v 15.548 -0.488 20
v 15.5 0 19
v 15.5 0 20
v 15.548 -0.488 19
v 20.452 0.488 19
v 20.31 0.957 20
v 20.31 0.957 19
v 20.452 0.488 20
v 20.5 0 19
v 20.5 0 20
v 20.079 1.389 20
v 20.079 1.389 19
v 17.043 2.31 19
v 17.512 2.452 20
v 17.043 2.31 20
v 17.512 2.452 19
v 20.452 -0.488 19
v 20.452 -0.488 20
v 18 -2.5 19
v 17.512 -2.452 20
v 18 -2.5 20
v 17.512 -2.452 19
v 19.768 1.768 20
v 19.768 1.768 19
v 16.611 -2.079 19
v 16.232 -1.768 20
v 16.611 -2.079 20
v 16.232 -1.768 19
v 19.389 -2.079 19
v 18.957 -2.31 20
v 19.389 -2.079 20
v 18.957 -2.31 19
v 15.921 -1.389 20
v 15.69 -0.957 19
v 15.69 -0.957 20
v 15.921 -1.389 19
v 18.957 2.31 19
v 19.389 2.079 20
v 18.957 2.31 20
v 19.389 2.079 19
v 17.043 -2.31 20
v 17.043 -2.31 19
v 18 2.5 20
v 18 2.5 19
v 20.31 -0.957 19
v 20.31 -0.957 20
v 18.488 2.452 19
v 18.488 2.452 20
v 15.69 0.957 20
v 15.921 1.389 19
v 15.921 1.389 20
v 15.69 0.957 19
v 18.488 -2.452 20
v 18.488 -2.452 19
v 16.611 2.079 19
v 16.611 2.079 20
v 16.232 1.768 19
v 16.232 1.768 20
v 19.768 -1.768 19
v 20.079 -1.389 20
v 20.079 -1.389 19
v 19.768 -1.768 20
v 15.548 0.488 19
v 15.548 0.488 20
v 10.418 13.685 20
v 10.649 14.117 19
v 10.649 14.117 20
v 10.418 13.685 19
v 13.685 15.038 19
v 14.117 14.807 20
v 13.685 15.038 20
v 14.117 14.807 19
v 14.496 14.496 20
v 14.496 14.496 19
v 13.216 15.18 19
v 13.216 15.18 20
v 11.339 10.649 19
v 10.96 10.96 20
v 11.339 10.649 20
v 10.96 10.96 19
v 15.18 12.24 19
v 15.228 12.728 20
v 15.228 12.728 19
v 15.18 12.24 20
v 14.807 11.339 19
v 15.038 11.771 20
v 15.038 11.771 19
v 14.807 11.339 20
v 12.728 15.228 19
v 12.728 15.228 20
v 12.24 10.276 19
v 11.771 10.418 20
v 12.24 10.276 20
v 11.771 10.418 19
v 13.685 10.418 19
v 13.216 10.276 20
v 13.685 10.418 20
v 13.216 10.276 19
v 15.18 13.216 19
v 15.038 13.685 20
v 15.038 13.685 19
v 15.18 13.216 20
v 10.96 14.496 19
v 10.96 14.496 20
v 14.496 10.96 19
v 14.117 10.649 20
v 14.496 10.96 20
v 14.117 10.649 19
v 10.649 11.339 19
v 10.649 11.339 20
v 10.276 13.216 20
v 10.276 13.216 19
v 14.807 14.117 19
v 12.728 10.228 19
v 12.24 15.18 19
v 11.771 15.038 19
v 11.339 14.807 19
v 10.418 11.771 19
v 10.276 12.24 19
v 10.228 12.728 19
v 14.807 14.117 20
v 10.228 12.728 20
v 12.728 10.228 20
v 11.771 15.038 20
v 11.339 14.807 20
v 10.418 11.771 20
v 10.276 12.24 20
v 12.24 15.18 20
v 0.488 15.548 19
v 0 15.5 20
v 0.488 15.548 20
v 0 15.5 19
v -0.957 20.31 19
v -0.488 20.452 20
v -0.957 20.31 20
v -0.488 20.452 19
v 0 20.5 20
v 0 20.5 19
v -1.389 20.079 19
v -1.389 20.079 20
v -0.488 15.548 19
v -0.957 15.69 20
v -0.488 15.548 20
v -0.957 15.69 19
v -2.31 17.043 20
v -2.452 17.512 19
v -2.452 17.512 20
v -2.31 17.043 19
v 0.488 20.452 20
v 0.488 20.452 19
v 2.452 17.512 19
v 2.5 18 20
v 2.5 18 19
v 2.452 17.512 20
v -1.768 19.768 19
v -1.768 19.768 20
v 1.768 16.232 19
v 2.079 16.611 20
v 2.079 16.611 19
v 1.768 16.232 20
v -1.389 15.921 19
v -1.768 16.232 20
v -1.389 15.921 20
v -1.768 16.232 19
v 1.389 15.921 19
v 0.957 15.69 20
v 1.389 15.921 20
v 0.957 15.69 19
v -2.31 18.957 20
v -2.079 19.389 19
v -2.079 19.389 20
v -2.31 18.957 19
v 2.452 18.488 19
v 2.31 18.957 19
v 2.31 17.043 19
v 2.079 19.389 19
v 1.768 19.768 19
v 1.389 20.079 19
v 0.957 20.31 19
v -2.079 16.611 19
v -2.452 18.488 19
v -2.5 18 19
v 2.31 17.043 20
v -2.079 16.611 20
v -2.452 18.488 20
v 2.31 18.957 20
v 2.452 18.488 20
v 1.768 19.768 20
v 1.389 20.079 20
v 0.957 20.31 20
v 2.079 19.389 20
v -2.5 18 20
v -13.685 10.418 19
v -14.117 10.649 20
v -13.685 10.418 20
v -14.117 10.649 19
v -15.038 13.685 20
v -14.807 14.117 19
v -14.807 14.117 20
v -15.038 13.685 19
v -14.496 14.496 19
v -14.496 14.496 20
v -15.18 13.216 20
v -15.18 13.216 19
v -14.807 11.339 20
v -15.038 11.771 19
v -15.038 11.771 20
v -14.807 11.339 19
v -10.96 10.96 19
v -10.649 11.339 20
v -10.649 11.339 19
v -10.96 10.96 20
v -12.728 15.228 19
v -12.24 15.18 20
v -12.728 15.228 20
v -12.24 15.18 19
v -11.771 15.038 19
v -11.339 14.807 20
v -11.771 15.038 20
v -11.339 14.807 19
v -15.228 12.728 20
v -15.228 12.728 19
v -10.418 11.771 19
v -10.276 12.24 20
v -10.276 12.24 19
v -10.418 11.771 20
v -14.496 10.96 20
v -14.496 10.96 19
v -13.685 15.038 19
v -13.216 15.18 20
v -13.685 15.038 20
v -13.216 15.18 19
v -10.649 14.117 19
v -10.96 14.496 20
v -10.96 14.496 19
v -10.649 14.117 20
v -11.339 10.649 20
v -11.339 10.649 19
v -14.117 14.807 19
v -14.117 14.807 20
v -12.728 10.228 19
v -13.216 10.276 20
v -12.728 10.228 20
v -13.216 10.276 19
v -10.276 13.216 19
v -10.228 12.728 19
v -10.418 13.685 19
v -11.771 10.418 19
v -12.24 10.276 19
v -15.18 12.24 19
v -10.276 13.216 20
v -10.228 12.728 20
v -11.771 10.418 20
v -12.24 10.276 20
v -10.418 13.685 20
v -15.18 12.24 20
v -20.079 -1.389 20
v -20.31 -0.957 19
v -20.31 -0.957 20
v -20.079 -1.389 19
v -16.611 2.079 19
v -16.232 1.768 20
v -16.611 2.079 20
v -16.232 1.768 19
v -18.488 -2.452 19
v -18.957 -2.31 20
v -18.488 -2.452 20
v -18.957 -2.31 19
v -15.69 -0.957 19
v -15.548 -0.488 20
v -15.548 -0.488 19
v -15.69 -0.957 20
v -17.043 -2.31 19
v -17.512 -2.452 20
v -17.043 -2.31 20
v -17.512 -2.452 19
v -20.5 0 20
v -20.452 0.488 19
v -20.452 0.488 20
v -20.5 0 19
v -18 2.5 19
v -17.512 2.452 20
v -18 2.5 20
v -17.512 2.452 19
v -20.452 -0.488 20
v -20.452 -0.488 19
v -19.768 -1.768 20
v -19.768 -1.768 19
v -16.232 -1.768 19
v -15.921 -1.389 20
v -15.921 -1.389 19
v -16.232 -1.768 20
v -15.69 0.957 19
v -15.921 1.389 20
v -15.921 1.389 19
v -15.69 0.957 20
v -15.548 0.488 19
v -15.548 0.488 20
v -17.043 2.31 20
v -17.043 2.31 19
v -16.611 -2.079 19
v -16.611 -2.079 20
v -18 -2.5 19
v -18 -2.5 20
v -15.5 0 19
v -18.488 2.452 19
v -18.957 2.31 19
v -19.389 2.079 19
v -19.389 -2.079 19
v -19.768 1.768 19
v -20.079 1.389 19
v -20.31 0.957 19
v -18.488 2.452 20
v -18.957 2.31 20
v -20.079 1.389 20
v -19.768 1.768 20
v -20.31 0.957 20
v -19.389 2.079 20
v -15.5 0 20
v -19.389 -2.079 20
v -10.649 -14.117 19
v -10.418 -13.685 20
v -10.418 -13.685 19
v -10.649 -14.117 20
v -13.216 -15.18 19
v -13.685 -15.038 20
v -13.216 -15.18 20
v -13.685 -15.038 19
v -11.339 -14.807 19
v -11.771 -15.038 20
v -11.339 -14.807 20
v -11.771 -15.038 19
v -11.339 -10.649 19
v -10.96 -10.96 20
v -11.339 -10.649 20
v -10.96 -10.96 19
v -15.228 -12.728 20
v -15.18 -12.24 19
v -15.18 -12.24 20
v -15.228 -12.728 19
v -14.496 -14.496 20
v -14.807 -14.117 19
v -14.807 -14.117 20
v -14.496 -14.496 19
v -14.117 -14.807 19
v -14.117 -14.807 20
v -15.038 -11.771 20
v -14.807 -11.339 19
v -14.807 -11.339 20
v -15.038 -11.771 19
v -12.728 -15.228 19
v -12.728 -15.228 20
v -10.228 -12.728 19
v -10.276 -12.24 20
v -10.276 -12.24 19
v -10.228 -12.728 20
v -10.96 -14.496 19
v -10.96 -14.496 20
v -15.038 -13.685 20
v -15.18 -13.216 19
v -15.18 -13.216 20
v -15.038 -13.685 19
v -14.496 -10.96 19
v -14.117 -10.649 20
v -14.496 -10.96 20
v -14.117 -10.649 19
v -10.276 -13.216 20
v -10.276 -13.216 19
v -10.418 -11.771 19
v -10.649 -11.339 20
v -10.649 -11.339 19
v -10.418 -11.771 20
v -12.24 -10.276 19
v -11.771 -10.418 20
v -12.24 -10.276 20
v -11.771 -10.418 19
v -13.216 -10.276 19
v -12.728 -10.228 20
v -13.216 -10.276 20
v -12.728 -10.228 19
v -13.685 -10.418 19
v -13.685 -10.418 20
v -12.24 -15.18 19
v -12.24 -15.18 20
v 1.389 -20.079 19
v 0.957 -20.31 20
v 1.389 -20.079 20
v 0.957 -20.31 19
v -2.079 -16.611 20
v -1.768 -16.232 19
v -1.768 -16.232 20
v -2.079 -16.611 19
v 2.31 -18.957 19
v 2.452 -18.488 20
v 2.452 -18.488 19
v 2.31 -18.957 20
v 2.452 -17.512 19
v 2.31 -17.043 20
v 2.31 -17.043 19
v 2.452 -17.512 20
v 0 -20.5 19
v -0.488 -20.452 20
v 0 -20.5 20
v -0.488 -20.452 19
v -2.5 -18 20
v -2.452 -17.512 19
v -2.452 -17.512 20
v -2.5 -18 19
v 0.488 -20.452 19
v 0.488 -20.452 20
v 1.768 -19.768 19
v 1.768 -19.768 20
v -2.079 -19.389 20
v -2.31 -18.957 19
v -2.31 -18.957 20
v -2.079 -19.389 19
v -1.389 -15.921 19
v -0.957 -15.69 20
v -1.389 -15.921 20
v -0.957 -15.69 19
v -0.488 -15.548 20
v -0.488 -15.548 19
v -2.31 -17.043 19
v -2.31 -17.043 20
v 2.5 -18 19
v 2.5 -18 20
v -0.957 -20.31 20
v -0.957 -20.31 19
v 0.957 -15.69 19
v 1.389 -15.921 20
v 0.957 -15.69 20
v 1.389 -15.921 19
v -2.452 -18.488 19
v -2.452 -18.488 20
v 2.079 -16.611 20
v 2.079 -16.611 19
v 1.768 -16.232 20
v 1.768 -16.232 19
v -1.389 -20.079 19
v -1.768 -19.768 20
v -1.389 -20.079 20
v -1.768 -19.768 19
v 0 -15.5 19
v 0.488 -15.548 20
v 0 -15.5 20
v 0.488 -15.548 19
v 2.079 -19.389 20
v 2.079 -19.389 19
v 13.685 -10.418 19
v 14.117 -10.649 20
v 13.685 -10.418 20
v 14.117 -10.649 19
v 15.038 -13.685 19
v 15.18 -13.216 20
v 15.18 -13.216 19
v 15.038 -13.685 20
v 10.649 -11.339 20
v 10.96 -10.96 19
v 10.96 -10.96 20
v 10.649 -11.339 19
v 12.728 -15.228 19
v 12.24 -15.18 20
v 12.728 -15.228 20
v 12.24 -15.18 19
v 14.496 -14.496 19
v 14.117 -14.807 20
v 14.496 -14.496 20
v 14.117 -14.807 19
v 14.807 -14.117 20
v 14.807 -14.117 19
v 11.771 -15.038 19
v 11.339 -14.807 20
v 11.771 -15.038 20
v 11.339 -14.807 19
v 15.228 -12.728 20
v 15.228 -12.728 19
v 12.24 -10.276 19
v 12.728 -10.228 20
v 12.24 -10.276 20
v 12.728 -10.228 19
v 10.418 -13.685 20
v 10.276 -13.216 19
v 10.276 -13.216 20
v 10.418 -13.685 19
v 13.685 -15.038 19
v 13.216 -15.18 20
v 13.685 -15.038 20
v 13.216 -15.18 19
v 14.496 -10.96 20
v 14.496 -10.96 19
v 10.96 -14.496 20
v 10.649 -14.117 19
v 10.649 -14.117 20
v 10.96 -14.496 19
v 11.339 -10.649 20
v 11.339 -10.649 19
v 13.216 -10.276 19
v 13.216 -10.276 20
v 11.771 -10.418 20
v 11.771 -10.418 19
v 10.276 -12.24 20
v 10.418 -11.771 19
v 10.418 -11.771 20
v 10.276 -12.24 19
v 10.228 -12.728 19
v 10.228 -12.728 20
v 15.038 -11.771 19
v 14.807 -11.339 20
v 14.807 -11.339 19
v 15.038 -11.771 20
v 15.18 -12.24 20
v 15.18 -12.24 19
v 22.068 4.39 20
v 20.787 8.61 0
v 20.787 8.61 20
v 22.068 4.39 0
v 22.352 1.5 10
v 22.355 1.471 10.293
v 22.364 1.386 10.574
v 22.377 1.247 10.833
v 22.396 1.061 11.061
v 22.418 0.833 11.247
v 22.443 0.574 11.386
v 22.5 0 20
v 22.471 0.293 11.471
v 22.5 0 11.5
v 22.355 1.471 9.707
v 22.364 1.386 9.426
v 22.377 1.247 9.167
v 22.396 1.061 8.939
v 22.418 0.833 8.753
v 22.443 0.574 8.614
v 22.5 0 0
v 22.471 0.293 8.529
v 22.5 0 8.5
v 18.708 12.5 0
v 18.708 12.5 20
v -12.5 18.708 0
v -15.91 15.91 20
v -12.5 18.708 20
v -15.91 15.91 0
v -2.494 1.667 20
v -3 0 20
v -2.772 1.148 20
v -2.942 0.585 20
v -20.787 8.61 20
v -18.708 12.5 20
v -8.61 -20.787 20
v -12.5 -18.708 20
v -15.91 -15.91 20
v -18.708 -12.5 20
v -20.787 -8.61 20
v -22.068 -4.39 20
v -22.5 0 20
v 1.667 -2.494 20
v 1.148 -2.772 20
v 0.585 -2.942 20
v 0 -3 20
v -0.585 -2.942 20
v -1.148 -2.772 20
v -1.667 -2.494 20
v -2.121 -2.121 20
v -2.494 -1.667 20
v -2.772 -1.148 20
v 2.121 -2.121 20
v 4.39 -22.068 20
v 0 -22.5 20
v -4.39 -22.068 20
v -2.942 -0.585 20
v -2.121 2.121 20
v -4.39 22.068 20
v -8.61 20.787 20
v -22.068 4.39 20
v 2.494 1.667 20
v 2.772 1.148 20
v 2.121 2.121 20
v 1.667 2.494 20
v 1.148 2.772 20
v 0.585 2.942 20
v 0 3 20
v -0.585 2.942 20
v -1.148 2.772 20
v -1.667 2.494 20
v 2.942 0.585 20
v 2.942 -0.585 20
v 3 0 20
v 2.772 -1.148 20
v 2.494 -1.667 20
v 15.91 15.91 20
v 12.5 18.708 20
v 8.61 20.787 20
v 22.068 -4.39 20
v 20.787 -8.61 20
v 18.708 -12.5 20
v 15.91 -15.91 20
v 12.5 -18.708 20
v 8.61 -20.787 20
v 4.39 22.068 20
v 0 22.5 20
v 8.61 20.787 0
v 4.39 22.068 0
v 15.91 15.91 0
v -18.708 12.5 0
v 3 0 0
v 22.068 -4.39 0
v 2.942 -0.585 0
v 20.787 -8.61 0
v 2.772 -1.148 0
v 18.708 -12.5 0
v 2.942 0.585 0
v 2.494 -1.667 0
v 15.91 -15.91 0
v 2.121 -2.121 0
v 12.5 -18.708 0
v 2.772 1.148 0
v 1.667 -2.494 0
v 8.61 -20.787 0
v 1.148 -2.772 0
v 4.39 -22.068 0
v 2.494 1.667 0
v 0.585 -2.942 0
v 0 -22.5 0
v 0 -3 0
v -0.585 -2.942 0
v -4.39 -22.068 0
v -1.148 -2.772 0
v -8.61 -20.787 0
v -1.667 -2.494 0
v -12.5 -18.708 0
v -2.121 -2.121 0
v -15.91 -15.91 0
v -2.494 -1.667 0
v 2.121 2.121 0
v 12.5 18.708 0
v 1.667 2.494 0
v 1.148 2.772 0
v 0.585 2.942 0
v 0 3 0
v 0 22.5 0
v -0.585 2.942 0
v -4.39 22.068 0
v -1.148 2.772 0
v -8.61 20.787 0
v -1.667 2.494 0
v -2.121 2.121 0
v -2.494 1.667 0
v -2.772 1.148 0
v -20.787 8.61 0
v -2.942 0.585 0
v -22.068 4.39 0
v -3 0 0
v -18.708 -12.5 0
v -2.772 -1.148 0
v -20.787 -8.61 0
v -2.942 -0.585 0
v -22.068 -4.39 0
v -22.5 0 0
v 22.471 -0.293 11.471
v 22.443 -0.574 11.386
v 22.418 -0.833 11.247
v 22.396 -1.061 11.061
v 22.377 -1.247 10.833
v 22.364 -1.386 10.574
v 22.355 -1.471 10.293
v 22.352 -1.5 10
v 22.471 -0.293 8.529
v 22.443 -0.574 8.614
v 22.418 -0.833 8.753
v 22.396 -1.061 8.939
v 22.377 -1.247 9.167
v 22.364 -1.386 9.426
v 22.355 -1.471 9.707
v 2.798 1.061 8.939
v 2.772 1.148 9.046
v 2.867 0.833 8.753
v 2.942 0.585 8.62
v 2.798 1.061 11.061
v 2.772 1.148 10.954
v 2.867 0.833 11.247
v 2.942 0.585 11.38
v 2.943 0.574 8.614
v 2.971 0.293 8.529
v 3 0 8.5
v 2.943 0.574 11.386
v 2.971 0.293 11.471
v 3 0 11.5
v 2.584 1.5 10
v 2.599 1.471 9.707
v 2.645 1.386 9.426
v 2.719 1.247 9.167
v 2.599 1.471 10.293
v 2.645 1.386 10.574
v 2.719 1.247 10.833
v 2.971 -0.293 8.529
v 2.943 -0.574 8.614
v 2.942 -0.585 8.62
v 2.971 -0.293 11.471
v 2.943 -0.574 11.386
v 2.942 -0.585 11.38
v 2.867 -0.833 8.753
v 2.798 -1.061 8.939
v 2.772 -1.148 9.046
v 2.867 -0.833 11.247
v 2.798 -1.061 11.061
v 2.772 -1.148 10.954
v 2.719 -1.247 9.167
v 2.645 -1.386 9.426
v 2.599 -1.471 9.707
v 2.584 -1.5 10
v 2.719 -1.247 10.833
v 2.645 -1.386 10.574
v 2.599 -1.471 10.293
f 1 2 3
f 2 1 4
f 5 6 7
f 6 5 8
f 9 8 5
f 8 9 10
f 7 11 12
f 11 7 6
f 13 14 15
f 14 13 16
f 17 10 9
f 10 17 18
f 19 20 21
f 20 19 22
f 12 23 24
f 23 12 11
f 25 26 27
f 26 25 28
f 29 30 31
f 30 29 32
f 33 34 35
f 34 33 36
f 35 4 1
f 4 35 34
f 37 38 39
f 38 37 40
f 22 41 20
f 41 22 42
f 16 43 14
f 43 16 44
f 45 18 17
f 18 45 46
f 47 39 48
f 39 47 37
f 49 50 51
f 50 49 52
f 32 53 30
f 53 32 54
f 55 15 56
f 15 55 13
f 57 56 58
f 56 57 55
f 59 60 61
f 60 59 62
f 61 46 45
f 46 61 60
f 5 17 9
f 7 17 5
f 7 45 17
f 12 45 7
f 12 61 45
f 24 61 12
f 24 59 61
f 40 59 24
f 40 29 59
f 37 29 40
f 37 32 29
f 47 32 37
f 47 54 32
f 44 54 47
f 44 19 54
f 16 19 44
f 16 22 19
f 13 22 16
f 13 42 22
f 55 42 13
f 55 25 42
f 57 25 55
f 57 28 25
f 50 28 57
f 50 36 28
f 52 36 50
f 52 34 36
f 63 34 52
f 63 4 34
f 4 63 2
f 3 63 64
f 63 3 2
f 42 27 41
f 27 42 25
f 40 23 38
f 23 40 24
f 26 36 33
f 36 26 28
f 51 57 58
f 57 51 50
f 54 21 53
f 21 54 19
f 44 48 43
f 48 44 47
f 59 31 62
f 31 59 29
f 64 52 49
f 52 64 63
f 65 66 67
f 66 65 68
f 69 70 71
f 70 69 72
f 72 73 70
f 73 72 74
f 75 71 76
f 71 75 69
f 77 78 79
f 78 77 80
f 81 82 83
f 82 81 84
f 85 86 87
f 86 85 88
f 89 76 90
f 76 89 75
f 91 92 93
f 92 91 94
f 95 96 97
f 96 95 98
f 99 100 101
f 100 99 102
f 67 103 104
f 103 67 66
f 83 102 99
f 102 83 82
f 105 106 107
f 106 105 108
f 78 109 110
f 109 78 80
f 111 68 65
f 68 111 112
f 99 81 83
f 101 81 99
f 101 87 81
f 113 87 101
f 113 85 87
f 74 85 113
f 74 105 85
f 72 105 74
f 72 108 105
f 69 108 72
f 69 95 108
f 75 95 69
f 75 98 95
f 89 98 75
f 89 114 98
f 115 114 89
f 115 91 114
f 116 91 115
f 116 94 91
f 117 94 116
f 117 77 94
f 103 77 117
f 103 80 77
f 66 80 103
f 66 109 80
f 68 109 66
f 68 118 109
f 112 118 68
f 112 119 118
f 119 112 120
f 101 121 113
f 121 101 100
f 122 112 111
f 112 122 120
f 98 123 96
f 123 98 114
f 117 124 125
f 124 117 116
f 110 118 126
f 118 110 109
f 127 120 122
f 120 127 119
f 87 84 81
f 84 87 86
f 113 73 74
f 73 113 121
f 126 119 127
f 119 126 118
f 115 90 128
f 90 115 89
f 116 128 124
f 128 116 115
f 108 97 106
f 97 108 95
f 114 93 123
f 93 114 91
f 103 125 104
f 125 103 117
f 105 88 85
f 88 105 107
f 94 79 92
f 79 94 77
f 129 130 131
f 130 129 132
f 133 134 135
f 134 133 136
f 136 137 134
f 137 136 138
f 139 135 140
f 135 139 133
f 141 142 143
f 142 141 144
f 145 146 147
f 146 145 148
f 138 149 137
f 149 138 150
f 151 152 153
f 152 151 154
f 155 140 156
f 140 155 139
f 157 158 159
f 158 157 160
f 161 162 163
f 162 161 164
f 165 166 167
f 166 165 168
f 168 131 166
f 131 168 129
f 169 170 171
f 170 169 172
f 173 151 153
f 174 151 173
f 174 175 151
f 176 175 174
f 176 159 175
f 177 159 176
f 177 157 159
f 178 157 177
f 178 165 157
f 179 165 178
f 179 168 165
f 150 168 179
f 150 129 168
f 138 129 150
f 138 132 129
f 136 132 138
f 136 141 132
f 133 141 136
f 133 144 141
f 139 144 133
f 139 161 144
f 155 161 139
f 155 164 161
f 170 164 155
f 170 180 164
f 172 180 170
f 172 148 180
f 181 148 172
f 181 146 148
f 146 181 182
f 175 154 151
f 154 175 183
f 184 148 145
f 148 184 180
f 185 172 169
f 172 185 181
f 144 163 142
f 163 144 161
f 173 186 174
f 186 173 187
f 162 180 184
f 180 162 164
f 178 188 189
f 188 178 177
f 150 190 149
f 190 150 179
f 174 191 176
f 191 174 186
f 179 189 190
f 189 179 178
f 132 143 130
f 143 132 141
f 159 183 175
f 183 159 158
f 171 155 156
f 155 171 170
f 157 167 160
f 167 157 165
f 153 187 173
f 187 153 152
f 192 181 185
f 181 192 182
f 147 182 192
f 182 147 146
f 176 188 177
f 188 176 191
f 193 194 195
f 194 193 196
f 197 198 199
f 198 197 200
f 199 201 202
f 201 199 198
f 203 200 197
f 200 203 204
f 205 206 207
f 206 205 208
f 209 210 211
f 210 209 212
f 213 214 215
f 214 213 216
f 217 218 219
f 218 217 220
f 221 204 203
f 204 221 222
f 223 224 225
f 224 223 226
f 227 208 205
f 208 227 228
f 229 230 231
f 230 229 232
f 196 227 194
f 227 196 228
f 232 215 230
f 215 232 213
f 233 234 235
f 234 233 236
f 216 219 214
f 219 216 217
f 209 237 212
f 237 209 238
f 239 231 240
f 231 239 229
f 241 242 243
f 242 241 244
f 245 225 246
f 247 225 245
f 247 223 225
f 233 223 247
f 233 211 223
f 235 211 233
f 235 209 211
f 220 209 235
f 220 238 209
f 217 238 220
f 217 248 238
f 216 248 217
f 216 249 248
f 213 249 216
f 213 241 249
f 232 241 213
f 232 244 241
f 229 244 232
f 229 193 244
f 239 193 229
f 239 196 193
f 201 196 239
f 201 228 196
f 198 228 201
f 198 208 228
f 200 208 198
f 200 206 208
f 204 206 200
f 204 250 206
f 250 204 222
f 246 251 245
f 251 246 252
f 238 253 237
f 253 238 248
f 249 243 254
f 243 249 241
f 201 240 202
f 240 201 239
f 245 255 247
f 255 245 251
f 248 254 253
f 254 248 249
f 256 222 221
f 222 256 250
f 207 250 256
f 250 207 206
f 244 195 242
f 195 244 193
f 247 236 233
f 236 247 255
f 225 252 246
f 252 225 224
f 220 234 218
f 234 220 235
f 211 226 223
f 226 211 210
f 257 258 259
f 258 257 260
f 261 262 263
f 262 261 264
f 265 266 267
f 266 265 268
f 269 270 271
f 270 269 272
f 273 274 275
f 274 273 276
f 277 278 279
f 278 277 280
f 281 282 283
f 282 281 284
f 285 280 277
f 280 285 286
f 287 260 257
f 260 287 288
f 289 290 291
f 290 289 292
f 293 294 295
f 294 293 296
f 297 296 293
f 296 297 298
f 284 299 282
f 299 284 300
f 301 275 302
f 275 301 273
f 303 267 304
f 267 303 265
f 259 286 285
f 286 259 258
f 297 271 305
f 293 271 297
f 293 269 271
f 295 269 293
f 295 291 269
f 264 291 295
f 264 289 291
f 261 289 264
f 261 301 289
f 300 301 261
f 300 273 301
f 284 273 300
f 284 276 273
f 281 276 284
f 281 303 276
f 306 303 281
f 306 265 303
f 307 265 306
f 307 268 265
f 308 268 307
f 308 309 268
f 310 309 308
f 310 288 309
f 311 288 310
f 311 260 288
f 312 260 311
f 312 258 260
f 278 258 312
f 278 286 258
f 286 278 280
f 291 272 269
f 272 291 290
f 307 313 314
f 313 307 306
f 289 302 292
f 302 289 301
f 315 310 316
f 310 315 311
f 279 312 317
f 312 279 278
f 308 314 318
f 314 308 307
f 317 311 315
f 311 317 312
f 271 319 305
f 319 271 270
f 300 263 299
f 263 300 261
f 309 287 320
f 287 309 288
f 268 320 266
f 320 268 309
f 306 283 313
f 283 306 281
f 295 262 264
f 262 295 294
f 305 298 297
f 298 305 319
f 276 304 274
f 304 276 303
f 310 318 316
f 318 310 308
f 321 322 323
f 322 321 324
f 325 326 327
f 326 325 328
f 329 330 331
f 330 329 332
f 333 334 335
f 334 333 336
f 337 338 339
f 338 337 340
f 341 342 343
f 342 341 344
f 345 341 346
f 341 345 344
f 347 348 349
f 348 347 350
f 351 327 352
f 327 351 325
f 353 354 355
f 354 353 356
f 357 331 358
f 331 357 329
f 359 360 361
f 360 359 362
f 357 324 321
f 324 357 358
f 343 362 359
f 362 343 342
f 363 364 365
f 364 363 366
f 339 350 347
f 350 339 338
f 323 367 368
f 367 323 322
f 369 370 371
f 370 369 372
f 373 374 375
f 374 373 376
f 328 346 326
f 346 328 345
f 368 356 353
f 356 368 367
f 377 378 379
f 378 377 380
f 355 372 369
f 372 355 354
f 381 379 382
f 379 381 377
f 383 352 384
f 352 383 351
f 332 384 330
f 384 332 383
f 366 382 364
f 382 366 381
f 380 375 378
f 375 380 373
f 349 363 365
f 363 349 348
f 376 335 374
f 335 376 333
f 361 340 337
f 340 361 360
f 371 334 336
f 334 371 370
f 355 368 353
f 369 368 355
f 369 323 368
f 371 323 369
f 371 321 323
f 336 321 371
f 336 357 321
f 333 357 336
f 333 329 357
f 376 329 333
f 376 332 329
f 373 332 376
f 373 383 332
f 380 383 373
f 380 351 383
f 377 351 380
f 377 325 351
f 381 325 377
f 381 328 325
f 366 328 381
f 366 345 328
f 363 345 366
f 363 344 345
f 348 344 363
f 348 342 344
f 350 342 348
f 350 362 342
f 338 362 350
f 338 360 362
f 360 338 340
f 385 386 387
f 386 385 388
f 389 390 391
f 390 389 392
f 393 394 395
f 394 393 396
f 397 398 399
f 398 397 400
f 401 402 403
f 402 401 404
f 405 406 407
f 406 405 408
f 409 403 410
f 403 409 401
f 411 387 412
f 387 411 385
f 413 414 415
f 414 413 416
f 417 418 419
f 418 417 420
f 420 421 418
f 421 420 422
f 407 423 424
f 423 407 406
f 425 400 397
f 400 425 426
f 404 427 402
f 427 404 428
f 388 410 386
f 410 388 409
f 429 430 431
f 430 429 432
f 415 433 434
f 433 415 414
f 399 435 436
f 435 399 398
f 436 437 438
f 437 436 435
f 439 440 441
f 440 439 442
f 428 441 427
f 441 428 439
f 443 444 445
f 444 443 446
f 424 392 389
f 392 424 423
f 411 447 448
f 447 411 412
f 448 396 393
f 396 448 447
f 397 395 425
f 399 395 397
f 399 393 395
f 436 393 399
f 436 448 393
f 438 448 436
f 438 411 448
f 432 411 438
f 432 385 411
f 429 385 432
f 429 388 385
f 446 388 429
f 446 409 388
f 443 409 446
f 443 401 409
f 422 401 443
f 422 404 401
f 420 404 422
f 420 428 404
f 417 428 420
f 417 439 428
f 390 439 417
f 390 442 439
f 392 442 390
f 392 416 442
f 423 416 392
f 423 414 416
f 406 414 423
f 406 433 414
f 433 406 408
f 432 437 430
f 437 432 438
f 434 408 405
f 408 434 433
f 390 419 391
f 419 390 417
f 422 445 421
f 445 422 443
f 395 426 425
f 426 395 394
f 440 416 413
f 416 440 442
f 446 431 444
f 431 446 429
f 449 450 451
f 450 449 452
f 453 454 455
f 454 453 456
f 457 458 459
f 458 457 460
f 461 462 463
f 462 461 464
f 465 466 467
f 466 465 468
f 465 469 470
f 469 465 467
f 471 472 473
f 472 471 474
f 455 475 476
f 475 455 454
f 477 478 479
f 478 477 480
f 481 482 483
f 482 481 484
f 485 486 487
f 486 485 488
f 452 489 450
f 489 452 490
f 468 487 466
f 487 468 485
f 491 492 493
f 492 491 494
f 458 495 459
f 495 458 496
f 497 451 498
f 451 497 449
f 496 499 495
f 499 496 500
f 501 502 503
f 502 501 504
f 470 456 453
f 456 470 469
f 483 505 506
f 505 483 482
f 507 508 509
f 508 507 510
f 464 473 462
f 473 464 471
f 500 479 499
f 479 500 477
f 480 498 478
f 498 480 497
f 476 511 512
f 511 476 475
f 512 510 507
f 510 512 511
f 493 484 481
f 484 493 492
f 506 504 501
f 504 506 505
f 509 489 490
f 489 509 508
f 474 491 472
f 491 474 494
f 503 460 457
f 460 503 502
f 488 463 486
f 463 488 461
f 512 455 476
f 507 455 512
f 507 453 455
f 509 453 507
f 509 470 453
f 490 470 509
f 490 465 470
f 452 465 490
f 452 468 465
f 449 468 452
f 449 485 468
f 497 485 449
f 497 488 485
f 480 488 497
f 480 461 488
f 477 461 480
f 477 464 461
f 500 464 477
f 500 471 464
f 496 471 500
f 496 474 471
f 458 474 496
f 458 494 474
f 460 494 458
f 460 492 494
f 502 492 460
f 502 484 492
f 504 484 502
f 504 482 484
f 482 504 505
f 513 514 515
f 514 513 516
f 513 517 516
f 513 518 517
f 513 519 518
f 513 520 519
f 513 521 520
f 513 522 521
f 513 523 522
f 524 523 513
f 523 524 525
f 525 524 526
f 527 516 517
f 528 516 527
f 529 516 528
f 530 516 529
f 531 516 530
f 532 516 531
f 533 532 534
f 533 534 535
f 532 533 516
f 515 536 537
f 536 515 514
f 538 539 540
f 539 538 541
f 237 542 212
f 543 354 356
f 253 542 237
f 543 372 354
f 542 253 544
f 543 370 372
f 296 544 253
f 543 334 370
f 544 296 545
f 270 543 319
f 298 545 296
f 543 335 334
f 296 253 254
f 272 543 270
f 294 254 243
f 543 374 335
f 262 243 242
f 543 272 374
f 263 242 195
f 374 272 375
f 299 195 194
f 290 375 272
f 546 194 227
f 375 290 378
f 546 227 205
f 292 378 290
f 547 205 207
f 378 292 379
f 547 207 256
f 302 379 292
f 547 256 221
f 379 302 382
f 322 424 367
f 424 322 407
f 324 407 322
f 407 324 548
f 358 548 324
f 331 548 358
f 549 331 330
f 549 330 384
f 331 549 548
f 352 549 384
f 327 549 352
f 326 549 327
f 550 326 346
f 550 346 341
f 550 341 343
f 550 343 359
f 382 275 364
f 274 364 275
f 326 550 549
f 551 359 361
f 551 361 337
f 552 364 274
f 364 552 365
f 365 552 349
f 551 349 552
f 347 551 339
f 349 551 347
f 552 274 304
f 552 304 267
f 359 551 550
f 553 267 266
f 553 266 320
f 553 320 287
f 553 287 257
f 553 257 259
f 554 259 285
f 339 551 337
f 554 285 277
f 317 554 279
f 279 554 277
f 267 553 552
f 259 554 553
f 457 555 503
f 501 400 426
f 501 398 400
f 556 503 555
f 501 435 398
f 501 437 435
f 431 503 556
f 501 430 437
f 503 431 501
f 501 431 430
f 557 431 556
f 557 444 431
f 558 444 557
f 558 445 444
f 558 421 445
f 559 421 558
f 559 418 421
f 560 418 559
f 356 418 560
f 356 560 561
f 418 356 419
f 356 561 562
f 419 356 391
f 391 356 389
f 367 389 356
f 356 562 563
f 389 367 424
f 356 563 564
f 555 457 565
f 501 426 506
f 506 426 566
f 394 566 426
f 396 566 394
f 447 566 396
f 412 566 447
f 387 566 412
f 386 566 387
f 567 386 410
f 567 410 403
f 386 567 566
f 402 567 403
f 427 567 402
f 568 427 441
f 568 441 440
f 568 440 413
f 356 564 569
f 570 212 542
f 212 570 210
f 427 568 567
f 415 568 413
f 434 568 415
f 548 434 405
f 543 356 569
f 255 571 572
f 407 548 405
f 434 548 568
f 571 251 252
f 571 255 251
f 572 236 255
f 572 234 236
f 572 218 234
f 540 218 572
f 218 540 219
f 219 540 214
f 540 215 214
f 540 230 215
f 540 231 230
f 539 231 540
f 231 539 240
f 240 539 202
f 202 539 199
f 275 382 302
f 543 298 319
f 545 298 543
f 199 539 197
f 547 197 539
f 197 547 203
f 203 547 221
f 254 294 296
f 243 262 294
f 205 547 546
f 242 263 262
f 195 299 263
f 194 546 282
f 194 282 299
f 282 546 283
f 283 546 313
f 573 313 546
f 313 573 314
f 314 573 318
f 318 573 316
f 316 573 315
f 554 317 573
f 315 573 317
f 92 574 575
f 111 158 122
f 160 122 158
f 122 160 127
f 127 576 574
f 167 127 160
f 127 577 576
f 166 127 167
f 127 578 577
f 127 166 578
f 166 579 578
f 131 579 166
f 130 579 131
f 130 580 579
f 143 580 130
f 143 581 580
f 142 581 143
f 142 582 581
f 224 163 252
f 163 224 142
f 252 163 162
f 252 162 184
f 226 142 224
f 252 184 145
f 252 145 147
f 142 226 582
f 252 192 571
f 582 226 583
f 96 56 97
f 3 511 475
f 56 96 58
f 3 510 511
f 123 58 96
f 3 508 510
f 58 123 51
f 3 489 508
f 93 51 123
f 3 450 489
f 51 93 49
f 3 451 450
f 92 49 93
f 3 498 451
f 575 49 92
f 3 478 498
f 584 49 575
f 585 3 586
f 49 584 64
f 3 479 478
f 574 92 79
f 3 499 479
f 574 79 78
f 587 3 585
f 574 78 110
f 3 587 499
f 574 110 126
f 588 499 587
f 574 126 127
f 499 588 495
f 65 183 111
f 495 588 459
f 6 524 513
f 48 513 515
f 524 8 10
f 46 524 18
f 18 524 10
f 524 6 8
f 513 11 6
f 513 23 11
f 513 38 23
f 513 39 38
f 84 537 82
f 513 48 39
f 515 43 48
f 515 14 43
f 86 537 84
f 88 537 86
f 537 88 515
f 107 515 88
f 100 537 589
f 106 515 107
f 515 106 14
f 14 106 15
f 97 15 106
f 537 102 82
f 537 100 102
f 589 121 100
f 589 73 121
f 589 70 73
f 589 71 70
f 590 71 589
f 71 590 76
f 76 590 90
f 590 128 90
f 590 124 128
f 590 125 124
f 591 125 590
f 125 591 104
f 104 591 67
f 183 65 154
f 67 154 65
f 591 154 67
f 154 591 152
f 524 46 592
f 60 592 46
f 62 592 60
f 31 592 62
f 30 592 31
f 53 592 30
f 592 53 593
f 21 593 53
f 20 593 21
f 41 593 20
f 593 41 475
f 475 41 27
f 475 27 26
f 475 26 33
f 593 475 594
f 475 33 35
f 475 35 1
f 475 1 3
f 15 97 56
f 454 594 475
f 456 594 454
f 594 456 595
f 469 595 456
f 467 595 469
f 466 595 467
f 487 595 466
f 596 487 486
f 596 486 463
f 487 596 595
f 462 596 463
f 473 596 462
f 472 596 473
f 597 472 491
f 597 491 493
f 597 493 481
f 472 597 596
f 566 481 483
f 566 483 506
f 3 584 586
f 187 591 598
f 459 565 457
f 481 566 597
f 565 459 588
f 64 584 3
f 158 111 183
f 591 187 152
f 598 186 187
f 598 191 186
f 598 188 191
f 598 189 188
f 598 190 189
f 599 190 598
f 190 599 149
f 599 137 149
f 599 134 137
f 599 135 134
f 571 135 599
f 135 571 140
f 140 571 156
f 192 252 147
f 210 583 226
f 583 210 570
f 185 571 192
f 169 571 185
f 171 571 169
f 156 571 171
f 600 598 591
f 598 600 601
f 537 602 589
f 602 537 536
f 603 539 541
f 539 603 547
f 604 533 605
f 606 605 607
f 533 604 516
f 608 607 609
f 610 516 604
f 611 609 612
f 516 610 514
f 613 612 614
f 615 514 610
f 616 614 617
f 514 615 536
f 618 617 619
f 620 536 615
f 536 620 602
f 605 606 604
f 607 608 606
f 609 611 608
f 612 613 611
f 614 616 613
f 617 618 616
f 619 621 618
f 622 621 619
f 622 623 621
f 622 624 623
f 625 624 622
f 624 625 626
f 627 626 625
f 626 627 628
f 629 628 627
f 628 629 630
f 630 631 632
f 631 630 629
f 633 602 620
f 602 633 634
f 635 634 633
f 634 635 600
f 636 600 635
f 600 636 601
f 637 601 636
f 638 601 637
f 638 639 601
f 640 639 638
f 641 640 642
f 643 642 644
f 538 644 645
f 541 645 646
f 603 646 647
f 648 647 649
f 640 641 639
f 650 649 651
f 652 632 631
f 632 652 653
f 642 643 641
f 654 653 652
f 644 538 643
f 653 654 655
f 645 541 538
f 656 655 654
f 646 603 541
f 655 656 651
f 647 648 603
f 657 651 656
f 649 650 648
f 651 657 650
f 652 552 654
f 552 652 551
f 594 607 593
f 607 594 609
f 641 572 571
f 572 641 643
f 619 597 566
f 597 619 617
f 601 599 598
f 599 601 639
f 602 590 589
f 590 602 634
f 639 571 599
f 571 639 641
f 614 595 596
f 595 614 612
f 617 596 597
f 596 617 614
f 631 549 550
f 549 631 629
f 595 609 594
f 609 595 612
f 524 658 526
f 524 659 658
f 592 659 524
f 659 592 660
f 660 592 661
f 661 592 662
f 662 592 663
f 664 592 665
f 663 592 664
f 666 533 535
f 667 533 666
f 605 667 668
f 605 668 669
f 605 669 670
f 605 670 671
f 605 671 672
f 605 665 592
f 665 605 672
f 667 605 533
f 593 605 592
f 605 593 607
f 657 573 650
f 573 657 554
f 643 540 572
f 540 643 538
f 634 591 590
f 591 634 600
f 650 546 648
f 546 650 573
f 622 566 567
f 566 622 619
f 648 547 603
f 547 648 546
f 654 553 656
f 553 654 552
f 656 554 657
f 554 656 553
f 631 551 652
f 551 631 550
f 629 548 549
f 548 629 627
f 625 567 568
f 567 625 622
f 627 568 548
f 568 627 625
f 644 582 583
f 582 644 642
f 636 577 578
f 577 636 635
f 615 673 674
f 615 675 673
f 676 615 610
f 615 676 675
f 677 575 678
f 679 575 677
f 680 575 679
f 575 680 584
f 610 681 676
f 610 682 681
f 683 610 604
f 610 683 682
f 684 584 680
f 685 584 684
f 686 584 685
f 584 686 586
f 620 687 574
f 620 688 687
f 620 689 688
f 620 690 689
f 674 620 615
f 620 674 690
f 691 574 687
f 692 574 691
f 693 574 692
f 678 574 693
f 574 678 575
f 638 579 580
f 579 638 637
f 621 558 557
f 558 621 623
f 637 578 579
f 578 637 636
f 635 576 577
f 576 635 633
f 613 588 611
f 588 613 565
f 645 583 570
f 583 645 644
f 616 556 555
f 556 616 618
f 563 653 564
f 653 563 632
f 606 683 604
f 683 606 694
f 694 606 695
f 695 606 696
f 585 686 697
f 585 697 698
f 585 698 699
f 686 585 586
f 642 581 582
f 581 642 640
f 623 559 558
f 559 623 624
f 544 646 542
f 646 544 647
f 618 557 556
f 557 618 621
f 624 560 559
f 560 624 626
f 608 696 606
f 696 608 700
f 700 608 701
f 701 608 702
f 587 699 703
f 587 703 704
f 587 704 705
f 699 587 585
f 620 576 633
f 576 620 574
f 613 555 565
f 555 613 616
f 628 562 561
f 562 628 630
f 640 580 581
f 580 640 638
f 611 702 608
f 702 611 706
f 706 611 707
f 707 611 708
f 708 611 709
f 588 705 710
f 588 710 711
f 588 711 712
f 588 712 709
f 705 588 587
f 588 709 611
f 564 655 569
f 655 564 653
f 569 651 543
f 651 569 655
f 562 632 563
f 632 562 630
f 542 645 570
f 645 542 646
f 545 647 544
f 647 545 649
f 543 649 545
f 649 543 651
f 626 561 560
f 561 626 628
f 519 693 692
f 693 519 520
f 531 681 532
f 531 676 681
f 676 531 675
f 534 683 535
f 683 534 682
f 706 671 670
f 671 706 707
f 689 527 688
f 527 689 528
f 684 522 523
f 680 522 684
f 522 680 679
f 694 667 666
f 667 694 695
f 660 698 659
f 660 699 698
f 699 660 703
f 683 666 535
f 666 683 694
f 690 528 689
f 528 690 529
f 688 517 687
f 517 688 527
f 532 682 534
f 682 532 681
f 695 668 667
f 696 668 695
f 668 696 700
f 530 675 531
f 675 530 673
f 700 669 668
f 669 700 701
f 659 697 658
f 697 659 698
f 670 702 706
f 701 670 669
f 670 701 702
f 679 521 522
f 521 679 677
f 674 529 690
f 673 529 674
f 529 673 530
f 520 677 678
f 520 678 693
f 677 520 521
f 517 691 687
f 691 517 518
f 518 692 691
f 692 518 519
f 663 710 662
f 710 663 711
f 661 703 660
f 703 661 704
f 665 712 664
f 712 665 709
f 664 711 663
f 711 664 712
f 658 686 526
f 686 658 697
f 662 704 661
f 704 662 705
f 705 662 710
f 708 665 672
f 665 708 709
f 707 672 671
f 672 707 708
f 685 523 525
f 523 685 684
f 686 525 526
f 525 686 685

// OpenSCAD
$fn = 32;

// ----------------------------------------------------------------------
// Control knob: dimpled knob
// ----------------------------------------------------------------------

// --- parameters (mm) ---
dimp_d = 5;               // finger dimple diameter
n_dimp = 8;               // number of dimples
dimp_r = 18;              // dimple ring radius
knob_d = 45;              // knob body diameter
knob_h = 20;              // knob body height
bore_d = 6;               // shaft bore diameter
set_d = 3;                // set screw bore diameter
fit_tol = 0.1;            // tolerance for press fits, mm
free_tol = 0.5;           // tolerance for clearance fits, mm

dimp_step = 360 / n_dimp;  // dimple angular step

difference() {
  cylinder(h = knob_h, d = knob_d);
  translate([0, 0, -1]) cylinder(h = knob_h + 2, d = bore_d);
  translate([-1, 0, knob_h / 2]) rotate([0, 90, 0])
    cylinder(h = knob_d / 2 + bore_d / 2 + 2, d = set_d);  for (i = [0 : n_dimp - 1])
    rotate([0, 0, i * dimp_step])
      translate([dimp_r, 0, knob_h - 1])
        cylinder(h = 2, d = dimp_d);
}
